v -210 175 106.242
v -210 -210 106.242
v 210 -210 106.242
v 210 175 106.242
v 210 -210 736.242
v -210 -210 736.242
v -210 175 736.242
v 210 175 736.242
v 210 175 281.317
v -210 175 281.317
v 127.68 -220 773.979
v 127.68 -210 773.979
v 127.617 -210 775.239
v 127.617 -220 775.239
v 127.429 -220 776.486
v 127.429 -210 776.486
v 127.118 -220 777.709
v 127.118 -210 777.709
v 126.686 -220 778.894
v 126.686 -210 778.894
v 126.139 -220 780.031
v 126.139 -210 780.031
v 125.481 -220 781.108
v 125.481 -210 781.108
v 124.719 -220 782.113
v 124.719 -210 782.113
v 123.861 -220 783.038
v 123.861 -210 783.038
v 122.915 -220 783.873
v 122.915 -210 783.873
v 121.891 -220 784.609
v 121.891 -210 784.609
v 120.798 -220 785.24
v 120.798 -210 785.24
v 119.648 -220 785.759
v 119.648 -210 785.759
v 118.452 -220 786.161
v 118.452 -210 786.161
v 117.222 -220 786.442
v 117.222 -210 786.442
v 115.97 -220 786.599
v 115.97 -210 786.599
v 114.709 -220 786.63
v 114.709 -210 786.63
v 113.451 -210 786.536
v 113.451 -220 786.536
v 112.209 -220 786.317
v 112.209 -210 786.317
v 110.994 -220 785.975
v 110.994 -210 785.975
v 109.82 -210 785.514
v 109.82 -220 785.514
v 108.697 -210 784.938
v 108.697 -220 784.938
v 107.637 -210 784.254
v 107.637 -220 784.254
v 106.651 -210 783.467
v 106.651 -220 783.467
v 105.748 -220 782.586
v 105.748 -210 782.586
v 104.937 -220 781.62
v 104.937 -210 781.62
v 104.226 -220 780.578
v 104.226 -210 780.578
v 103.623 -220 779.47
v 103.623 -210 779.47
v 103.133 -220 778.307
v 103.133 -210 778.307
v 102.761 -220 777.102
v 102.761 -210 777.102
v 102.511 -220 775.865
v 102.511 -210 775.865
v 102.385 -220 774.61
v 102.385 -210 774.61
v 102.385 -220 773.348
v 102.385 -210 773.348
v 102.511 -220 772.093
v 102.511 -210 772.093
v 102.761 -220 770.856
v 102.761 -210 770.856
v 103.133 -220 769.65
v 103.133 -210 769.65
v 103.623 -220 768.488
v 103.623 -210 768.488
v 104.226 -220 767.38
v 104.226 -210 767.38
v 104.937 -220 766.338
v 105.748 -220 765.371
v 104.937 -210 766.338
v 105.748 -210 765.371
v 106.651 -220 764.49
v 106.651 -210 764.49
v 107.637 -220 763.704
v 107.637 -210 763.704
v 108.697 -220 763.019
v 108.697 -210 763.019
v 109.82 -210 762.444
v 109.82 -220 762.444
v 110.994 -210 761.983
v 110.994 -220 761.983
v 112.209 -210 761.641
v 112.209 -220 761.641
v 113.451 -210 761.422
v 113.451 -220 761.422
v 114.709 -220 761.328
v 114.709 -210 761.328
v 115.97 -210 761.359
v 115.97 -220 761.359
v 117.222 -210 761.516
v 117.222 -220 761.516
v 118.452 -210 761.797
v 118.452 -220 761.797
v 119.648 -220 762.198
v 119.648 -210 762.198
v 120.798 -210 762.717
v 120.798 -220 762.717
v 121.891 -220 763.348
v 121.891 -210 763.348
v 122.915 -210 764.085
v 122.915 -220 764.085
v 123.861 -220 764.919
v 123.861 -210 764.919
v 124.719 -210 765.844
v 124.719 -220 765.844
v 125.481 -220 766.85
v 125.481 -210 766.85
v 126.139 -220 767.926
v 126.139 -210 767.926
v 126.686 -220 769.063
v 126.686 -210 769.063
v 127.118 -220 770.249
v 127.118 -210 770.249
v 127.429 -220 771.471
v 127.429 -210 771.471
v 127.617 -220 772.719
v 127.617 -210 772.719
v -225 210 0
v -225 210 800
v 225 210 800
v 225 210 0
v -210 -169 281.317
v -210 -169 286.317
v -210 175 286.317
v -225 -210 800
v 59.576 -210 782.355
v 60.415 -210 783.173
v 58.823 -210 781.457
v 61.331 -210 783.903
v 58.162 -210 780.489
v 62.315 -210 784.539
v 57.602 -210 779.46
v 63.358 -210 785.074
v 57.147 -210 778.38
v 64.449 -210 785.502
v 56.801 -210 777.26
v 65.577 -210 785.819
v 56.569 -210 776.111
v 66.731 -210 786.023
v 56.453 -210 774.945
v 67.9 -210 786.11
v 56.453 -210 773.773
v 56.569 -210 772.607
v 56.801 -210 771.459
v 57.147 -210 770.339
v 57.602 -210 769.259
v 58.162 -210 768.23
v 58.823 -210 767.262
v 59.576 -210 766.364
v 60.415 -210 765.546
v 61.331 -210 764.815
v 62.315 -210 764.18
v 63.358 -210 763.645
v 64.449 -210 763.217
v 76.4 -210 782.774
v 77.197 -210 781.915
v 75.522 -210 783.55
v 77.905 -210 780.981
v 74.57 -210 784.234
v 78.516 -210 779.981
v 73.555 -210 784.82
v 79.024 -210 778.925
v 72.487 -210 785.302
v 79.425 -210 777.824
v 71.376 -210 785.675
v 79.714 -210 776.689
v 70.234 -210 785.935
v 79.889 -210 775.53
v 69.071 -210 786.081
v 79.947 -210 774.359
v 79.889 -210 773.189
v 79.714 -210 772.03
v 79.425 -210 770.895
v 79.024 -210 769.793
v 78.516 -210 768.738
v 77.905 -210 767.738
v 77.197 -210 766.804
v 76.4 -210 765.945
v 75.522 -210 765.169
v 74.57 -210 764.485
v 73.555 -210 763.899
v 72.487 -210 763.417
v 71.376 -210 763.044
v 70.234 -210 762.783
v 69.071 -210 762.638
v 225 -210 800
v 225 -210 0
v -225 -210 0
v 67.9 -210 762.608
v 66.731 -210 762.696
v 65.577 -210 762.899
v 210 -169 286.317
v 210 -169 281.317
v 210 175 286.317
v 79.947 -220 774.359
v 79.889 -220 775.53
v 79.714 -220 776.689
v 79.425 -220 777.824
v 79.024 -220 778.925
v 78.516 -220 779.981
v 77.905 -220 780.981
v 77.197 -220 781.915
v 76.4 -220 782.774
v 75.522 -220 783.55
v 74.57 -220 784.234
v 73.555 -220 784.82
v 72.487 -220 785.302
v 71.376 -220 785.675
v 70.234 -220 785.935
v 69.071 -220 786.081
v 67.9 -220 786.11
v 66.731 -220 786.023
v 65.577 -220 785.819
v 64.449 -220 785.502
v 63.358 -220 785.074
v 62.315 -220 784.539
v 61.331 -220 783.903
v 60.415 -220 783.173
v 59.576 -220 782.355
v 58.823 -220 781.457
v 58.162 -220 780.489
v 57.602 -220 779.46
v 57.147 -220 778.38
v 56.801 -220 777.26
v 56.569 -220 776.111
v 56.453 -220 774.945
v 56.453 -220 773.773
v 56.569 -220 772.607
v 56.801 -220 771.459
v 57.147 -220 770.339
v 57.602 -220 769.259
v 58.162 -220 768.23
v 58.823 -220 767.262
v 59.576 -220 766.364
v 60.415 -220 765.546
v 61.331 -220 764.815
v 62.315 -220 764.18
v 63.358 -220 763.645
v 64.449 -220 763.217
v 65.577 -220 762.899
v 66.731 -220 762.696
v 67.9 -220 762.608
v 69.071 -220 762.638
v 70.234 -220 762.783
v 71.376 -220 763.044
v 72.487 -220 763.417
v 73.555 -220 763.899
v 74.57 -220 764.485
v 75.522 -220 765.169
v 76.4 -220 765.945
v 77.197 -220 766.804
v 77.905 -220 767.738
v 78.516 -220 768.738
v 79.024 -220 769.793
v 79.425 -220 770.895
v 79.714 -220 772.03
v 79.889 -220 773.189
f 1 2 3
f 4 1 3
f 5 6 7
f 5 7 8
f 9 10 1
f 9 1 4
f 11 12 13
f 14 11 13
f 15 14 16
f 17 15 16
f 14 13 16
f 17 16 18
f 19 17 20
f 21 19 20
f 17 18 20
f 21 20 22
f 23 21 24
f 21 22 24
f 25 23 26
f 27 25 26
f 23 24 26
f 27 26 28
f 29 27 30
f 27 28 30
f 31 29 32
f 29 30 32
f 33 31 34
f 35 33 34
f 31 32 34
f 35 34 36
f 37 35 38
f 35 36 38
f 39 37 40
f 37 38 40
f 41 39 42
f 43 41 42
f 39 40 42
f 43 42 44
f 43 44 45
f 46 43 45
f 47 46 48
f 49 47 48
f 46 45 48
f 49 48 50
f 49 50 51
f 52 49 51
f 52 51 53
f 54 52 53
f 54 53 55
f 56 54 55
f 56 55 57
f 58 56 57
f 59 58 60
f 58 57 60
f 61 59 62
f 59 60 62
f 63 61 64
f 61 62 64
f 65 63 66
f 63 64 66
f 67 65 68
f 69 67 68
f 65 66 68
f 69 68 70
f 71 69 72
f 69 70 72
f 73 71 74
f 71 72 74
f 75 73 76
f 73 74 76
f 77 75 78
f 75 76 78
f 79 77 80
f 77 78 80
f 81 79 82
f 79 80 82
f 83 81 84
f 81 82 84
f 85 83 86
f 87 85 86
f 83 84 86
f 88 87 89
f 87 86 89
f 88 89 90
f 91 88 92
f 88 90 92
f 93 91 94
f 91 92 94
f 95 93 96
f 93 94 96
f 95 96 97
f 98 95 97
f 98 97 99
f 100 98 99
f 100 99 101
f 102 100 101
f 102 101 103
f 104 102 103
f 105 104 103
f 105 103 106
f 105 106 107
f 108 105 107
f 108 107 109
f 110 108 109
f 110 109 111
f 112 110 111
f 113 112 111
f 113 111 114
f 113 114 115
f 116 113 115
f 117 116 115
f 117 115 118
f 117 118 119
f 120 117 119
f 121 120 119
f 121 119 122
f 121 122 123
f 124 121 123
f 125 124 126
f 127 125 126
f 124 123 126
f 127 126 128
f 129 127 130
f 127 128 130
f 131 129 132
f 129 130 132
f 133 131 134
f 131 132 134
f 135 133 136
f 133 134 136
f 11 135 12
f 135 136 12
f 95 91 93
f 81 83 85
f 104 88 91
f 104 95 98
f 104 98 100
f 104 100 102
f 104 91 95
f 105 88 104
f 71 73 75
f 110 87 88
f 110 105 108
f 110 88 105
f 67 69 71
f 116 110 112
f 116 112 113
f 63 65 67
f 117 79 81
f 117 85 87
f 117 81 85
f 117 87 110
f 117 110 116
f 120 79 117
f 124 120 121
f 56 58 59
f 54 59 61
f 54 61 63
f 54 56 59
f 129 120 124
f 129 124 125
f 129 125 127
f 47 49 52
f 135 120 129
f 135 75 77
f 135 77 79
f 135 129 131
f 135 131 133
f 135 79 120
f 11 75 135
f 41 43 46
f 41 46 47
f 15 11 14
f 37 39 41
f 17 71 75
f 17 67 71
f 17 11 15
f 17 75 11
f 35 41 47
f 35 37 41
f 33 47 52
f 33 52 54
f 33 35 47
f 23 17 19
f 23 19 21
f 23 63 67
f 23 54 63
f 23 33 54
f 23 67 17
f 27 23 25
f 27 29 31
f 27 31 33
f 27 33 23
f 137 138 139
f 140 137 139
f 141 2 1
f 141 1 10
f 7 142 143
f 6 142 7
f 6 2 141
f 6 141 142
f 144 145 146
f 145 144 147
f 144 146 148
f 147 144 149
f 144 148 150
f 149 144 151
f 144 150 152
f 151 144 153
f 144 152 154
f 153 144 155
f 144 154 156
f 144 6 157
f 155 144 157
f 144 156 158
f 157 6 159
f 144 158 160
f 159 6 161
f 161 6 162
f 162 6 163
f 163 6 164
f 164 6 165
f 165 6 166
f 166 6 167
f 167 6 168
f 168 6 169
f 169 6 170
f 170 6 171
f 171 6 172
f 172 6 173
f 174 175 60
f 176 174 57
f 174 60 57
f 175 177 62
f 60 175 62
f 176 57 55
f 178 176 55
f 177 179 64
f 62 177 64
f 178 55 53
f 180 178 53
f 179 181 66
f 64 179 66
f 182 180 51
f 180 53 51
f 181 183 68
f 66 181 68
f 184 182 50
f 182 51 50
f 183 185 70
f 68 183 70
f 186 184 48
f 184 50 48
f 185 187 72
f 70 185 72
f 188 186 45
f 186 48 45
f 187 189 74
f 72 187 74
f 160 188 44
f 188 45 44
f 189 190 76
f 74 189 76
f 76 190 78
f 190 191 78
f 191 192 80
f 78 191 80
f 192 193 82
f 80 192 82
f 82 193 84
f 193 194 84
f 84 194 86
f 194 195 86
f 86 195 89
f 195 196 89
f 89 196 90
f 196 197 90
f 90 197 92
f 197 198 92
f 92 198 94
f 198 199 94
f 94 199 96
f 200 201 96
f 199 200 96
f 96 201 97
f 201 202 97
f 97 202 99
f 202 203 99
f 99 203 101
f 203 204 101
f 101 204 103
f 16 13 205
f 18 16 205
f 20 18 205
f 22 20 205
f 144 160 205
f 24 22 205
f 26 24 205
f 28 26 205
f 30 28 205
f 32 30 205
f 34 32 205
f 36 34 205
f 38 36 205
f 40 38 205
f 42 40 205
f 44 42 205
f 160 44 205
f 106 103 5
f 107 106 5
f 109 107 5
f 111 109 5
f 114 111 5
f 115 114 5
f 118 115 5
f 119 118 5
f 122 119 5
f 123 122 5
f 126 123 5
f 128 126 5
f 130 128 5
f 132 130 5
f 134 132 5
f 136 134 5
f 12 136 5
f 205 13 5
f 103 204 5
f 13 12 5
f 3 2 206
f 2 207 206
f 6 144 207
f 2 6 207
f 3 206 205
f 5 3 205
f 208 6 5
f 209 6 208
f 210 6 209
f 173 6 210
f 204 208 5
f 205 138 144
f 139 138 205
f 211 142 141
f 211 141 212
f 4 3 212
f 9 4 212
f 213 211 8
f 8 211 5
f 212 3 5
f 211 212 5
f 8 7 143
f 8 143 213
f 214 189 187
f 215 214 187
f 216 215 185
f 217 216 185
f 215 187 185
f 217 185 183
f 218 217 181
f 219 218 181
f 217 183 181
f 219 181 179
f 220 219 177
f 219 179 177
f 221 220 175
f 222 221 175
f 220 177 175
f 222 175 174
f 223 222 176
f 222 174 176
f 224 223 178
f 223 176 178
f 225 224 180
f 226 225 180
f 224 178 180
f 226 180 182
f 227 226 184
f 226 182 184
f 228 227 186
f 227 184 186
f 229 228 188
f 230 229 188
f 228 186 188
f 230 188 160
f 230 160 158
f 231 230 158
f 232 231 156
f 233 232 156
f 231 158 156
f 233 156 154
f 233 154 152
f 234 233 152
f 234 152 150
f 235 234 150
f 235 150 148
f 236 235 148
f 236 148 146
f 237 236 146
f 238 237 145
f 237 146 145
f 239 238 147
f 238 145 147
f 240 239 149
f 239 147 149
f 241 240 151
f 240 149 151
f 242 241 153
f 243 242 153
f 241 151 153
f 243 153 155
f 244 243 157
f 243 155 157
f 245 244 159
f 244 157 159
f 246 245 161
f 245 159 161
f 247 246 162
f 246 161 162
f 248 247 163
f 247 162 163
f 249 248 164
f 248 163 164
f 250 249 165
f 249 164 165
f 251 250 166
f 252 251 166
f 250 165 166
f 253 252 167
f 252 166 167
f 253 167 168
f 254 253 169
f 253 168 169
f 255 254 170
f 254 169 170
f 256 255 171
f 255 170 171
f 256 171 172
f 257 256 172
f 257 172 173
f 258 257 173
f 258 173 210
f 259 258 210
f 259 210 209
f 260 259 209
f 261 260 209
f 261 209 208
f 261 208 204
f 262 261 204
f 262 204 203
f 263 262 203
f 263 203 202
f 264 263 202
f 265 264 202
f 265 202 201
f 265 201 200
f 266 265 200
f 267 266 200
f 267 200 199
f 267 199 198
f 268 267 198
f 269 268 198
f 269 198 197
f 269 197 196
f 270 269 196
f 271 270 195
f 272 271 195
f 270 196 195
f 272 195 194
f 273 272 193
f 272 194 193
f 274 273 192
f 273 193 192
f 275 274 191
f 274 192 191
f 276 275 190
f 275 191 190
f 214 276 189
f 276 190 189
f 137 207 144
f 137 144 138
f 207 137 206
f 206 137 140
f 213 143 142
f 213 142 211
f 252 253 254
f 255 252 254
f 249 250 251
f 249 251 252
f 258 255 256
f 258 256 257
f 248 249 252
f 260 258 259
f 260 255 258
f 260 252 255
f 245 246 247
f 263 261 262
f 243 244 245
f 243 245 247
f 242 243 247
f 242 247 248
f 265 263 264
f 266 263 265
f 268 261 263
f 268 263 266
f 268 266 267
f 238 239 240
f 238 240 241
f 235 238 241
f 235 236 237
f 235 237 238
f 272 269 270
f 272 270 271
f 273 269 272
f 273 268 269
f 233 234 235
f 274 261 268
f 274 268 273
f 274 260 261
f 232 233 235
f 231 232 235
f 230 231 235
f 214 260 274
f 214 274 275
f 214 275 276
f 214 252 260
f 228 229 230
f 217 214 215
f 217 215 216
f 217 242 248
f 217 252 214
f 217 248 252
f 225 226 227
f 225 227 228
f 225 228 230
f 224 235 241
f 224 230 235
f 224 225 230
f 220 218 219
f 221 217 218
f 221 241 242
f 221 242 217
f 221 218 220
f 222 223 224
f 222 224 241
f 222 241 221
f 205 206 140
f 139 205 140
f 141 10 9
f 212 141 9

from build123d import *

# Parameters (mm, degrees)
F0_W     = 450
F0_H     = 420
F1_DEPTH = 800
F2_W     = 420
F2_H     = 630
F3_DEPTH = 385
F4_W     = 420
F4_H     = 5
F5_DEPTH = 344
F6_R     = 11.754652
F6_R_2   = 12.655136
F7_DEPTH = 10


with BuildPart() as f1:
    # F0 (on Top) → F1 (new body)
    with BuildSketch(Plane.XY):
        Rectangle(F0_W, F0_H)
    extrude(amount=F1_DEPTH)

    # F2 (on face) → F3 (cut)
    with BuildSketch(Plane.XZ.offset(210)):
        with Locations((0, 421.241939)):
            Rectangle(F2_W, F2_H)
    extrude(amount=-F3_DEPTH, mode=Mode.SUBTRACT)

    # F4 (on face) → F5 (join)
    with BuildSketch(Plane.XZ.offset(-175)):
        with Locations((0, 283.817353)):
            Rectangle(F4_W, F4_H)
    extrude(amount=F5_DEPTH)

    # F6 (on face) → F7 (join)
    with BuildSketch(Plane.XZ.offset(210)):
        with Locations((68.192616, 774.359405)):
            Circle(F6_R)
        with Locations((115.024745, 773.97877)):
            Circle(F6_R_2)
    extrude(amount=F7_DEPTH)


solid = f1.part
